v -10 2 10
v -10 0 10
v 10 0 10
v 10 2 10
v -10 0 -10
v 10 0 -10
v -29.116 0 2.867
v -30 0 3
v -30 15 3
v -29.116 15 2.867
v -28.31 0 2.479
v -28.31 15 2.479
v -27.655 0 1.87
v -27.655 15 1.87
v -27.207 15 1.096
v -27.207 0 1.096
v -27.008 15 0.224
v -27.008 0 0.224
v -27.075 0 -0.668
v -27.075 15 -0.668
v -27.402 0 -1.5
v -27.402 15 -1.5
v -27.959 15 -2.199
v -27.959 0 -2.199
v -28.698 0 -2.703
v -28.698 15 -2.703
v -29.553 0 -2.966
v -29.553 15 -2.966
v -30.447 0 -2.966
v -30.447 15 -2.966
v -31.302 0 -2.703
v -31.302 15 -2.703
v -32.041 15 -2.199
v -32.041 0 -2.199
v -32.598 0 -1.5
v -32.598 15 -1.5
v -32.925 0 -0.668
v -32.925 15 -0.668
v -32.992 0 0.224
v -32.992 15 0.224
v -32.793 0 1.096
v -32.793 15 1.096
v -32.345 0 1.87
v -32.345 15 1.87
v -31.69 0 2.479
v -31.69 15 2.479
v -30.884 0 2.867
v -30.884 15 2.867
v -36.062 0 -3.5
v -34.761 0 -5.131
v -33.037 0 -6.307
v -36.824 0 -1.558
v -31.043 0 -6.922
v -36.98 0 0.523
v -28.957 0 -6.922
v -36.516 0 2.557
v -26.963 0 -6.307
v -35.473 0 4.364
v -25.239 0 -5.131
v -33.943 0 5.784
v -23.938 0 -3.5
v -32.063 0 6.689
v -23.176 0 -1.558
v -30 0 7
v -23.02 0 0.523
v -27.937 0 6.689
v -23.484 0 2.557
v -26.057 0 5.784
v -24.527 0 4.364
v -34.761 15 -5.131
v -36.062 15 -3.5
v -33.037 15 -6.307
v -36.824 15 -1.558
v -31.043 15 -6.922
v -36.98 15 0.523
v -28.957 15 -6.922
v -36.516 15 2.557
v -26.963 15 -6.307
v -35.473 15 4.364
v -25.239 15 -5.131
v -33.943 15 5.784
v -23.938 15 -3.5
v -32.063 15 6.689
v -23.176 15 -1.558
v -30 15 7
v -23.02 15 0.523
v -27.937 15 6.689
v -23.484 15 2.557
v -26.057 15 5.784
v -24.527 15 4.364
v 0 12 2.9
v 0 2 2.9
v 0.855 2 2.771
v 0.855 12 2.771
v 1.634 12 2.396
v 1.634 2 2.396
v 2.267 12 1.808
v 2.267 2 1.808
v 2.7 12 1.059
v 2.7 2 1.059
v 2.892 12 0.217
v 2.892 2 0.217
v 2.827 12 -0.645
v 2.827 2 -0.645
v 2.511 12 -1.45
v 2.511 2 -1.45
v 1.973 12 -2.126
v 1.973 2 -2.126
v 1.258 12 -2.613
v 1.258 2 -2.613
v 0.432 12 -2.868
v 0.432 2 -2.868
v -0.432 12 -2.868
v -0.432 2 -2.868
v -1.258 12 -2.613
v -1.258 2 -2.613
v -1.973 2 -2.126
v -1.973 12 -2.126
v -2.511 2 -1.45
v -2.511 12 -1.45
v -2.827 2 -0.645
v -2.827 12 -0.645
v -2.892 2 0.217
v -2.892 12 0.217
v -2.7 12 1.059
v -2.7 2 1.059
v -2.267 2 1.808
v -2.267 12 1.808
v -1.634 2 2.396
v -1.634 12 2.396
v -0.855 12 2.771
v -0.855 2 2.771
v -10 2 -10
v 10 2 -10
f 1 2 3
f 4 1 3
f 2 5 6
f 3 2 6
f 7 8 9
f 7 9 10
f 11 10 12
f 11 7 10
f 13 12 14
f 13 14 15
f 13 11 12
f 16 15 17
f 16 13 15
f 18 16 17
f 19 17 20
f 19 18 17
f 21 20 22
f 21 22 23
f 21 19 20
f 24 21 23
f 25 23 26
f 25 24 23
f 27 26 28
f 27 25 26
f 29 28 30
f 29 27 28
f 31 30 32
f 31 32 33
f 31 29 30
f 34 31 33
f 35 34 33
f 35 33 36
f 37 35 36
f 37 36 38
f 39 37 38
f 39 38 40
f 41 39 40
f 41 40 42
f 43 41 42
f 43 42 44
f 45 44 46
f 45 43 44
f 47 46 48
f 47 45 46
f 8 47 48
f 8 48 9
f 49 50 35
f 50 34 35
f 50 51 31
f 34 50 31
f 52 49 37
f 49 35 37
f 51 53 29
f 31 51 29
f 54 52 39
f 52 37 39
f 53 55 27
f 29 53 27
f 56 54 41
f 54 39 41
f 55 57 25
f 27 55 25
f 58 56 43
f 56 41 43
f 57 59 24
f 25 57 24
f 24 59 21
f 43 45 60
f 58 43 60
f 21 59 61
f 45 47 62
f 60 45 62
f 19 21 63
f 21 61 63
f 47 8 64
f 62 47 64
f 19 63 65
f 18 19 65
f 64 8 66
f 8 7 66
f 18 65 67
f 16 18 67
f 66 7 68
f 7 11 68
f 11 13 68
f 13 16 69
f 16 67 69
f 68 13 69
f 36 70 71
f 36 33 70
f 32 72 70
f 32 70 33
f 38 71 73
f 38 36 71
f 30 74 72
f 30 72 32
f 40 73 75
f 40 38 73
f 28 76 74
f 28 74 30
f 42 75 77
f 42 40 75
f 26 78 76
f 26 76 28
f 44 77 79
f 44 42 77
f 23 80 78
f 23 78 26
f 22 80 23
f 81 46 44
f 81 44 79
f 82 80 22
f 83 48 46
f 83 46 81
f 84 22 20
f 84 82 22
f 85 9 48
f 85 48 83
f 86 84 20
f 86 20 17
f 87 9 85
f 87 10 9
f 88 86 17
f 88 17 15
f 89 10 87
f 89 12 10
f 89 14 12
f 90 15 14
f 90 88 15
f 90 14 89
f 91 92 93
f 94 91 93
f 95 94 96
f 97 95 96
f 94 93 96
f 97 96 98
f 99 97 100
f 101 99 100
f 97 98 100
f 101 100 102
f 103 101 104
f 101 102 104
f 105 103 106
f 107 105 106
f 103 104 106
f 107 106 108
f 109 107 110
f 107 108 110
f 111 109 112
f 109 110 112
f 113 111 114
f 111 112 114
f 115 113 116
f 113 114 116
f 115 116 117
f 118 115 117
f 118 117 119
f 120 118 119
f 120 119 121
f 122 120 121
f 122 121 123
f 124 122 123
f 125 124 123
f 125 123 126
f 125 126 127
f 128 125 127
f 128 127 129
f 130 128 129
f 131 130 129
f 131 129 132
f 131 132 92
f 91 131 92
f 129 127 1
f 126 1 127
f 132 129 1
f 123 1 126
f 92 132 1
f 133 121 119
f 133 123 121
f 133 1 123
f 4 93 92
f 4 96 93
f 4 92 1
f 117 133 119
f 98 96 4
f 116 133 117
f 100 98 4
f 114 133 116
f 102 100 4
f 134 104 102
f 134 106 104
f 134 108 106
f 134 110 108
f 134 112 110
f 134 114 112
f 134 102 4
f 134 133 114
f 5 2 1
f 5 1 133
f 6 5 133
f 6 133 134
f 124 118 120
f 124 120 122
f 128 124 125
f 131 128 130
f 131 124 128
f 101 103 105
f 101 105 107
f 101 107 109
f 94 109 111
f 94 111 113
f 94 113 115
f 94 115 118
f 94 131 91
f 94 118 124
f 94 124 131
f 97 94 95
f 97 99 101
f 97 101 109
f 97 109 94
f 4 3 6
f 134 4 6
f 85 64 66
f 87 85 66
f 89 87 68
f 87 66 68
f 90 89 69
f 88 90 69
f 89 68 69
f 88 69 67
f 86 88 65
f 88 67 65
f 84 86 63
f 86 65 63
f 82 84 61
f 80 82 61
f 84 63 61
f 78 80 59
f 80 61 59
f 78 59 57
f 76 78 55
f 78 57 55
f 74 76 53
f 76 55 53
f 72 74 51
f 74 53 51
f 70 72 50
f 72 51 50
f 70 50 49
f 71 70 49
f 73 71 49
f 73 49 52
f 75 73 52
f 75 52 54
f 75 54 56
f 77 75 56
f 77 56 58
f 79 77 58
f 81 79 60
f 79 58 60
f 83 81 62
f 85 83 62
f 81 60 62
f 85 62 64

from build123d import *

# Parameters (mm, degrees)
SKETCH1_R           = 2.9
BOSS_EXTRUDE1_DEPTH = 12
SKETCH1_3_W         = 20
SKETCH1_3_H         = 20
SKETCH1_3_R         = 2.9
BOSS_EXTRUDE2_DEPTH = 2
SKETCH2_R           = 7
SKETCH2_R_2         = 3
BOSS_EXTRUDE3_DEPTH = 15


with BuildPart() as part:
    # Sketch1 → Boss-Extrude1 (new body)
    with BuildSketch(Plane(origin=(0, 0, 0), x_dir=(1, 0, 0), z_dir=(0, 1, 0))):
        Circle(SKETCH1_R)
    extrude(amount=BOSS_EXTRUDE1_DEPTH)

    # Sketch1<3> → Boss-Extrude2 (add)
    with BuildSketch(Plane(origin=(0, 0, 0), x_dir=(1, 0, 0), z_dir=(0, 1, 0))):
        Rectangle(SKETCH1_3_W, SKETCH1_3_H)
        Circle(SKETCH1_3_R, mode=Mode.SUBTRACT)
    extrude(amount=BOSS_EXTRUDE2_DEPTH)


with BuildPart() as body_2:
    # Sketch2 → Boss-Extrude3 (new body)
    with BuildSketch(Plane(origin=(0, 0, 0), x_dir=(1, 0, 0), z_dir=(0, 1, 0))):
        with Locations((-30, 0)):
            Circle(SKETCH2_R)
        with Locations((-30, 0)):
            Circle(SKETCH2_R_2, mode=Mode.SUBTRACT)
    extrude(amount=BOSS_EXTRUDE3_DEPTH)


solid = Compound([part.part, body_2.part])
